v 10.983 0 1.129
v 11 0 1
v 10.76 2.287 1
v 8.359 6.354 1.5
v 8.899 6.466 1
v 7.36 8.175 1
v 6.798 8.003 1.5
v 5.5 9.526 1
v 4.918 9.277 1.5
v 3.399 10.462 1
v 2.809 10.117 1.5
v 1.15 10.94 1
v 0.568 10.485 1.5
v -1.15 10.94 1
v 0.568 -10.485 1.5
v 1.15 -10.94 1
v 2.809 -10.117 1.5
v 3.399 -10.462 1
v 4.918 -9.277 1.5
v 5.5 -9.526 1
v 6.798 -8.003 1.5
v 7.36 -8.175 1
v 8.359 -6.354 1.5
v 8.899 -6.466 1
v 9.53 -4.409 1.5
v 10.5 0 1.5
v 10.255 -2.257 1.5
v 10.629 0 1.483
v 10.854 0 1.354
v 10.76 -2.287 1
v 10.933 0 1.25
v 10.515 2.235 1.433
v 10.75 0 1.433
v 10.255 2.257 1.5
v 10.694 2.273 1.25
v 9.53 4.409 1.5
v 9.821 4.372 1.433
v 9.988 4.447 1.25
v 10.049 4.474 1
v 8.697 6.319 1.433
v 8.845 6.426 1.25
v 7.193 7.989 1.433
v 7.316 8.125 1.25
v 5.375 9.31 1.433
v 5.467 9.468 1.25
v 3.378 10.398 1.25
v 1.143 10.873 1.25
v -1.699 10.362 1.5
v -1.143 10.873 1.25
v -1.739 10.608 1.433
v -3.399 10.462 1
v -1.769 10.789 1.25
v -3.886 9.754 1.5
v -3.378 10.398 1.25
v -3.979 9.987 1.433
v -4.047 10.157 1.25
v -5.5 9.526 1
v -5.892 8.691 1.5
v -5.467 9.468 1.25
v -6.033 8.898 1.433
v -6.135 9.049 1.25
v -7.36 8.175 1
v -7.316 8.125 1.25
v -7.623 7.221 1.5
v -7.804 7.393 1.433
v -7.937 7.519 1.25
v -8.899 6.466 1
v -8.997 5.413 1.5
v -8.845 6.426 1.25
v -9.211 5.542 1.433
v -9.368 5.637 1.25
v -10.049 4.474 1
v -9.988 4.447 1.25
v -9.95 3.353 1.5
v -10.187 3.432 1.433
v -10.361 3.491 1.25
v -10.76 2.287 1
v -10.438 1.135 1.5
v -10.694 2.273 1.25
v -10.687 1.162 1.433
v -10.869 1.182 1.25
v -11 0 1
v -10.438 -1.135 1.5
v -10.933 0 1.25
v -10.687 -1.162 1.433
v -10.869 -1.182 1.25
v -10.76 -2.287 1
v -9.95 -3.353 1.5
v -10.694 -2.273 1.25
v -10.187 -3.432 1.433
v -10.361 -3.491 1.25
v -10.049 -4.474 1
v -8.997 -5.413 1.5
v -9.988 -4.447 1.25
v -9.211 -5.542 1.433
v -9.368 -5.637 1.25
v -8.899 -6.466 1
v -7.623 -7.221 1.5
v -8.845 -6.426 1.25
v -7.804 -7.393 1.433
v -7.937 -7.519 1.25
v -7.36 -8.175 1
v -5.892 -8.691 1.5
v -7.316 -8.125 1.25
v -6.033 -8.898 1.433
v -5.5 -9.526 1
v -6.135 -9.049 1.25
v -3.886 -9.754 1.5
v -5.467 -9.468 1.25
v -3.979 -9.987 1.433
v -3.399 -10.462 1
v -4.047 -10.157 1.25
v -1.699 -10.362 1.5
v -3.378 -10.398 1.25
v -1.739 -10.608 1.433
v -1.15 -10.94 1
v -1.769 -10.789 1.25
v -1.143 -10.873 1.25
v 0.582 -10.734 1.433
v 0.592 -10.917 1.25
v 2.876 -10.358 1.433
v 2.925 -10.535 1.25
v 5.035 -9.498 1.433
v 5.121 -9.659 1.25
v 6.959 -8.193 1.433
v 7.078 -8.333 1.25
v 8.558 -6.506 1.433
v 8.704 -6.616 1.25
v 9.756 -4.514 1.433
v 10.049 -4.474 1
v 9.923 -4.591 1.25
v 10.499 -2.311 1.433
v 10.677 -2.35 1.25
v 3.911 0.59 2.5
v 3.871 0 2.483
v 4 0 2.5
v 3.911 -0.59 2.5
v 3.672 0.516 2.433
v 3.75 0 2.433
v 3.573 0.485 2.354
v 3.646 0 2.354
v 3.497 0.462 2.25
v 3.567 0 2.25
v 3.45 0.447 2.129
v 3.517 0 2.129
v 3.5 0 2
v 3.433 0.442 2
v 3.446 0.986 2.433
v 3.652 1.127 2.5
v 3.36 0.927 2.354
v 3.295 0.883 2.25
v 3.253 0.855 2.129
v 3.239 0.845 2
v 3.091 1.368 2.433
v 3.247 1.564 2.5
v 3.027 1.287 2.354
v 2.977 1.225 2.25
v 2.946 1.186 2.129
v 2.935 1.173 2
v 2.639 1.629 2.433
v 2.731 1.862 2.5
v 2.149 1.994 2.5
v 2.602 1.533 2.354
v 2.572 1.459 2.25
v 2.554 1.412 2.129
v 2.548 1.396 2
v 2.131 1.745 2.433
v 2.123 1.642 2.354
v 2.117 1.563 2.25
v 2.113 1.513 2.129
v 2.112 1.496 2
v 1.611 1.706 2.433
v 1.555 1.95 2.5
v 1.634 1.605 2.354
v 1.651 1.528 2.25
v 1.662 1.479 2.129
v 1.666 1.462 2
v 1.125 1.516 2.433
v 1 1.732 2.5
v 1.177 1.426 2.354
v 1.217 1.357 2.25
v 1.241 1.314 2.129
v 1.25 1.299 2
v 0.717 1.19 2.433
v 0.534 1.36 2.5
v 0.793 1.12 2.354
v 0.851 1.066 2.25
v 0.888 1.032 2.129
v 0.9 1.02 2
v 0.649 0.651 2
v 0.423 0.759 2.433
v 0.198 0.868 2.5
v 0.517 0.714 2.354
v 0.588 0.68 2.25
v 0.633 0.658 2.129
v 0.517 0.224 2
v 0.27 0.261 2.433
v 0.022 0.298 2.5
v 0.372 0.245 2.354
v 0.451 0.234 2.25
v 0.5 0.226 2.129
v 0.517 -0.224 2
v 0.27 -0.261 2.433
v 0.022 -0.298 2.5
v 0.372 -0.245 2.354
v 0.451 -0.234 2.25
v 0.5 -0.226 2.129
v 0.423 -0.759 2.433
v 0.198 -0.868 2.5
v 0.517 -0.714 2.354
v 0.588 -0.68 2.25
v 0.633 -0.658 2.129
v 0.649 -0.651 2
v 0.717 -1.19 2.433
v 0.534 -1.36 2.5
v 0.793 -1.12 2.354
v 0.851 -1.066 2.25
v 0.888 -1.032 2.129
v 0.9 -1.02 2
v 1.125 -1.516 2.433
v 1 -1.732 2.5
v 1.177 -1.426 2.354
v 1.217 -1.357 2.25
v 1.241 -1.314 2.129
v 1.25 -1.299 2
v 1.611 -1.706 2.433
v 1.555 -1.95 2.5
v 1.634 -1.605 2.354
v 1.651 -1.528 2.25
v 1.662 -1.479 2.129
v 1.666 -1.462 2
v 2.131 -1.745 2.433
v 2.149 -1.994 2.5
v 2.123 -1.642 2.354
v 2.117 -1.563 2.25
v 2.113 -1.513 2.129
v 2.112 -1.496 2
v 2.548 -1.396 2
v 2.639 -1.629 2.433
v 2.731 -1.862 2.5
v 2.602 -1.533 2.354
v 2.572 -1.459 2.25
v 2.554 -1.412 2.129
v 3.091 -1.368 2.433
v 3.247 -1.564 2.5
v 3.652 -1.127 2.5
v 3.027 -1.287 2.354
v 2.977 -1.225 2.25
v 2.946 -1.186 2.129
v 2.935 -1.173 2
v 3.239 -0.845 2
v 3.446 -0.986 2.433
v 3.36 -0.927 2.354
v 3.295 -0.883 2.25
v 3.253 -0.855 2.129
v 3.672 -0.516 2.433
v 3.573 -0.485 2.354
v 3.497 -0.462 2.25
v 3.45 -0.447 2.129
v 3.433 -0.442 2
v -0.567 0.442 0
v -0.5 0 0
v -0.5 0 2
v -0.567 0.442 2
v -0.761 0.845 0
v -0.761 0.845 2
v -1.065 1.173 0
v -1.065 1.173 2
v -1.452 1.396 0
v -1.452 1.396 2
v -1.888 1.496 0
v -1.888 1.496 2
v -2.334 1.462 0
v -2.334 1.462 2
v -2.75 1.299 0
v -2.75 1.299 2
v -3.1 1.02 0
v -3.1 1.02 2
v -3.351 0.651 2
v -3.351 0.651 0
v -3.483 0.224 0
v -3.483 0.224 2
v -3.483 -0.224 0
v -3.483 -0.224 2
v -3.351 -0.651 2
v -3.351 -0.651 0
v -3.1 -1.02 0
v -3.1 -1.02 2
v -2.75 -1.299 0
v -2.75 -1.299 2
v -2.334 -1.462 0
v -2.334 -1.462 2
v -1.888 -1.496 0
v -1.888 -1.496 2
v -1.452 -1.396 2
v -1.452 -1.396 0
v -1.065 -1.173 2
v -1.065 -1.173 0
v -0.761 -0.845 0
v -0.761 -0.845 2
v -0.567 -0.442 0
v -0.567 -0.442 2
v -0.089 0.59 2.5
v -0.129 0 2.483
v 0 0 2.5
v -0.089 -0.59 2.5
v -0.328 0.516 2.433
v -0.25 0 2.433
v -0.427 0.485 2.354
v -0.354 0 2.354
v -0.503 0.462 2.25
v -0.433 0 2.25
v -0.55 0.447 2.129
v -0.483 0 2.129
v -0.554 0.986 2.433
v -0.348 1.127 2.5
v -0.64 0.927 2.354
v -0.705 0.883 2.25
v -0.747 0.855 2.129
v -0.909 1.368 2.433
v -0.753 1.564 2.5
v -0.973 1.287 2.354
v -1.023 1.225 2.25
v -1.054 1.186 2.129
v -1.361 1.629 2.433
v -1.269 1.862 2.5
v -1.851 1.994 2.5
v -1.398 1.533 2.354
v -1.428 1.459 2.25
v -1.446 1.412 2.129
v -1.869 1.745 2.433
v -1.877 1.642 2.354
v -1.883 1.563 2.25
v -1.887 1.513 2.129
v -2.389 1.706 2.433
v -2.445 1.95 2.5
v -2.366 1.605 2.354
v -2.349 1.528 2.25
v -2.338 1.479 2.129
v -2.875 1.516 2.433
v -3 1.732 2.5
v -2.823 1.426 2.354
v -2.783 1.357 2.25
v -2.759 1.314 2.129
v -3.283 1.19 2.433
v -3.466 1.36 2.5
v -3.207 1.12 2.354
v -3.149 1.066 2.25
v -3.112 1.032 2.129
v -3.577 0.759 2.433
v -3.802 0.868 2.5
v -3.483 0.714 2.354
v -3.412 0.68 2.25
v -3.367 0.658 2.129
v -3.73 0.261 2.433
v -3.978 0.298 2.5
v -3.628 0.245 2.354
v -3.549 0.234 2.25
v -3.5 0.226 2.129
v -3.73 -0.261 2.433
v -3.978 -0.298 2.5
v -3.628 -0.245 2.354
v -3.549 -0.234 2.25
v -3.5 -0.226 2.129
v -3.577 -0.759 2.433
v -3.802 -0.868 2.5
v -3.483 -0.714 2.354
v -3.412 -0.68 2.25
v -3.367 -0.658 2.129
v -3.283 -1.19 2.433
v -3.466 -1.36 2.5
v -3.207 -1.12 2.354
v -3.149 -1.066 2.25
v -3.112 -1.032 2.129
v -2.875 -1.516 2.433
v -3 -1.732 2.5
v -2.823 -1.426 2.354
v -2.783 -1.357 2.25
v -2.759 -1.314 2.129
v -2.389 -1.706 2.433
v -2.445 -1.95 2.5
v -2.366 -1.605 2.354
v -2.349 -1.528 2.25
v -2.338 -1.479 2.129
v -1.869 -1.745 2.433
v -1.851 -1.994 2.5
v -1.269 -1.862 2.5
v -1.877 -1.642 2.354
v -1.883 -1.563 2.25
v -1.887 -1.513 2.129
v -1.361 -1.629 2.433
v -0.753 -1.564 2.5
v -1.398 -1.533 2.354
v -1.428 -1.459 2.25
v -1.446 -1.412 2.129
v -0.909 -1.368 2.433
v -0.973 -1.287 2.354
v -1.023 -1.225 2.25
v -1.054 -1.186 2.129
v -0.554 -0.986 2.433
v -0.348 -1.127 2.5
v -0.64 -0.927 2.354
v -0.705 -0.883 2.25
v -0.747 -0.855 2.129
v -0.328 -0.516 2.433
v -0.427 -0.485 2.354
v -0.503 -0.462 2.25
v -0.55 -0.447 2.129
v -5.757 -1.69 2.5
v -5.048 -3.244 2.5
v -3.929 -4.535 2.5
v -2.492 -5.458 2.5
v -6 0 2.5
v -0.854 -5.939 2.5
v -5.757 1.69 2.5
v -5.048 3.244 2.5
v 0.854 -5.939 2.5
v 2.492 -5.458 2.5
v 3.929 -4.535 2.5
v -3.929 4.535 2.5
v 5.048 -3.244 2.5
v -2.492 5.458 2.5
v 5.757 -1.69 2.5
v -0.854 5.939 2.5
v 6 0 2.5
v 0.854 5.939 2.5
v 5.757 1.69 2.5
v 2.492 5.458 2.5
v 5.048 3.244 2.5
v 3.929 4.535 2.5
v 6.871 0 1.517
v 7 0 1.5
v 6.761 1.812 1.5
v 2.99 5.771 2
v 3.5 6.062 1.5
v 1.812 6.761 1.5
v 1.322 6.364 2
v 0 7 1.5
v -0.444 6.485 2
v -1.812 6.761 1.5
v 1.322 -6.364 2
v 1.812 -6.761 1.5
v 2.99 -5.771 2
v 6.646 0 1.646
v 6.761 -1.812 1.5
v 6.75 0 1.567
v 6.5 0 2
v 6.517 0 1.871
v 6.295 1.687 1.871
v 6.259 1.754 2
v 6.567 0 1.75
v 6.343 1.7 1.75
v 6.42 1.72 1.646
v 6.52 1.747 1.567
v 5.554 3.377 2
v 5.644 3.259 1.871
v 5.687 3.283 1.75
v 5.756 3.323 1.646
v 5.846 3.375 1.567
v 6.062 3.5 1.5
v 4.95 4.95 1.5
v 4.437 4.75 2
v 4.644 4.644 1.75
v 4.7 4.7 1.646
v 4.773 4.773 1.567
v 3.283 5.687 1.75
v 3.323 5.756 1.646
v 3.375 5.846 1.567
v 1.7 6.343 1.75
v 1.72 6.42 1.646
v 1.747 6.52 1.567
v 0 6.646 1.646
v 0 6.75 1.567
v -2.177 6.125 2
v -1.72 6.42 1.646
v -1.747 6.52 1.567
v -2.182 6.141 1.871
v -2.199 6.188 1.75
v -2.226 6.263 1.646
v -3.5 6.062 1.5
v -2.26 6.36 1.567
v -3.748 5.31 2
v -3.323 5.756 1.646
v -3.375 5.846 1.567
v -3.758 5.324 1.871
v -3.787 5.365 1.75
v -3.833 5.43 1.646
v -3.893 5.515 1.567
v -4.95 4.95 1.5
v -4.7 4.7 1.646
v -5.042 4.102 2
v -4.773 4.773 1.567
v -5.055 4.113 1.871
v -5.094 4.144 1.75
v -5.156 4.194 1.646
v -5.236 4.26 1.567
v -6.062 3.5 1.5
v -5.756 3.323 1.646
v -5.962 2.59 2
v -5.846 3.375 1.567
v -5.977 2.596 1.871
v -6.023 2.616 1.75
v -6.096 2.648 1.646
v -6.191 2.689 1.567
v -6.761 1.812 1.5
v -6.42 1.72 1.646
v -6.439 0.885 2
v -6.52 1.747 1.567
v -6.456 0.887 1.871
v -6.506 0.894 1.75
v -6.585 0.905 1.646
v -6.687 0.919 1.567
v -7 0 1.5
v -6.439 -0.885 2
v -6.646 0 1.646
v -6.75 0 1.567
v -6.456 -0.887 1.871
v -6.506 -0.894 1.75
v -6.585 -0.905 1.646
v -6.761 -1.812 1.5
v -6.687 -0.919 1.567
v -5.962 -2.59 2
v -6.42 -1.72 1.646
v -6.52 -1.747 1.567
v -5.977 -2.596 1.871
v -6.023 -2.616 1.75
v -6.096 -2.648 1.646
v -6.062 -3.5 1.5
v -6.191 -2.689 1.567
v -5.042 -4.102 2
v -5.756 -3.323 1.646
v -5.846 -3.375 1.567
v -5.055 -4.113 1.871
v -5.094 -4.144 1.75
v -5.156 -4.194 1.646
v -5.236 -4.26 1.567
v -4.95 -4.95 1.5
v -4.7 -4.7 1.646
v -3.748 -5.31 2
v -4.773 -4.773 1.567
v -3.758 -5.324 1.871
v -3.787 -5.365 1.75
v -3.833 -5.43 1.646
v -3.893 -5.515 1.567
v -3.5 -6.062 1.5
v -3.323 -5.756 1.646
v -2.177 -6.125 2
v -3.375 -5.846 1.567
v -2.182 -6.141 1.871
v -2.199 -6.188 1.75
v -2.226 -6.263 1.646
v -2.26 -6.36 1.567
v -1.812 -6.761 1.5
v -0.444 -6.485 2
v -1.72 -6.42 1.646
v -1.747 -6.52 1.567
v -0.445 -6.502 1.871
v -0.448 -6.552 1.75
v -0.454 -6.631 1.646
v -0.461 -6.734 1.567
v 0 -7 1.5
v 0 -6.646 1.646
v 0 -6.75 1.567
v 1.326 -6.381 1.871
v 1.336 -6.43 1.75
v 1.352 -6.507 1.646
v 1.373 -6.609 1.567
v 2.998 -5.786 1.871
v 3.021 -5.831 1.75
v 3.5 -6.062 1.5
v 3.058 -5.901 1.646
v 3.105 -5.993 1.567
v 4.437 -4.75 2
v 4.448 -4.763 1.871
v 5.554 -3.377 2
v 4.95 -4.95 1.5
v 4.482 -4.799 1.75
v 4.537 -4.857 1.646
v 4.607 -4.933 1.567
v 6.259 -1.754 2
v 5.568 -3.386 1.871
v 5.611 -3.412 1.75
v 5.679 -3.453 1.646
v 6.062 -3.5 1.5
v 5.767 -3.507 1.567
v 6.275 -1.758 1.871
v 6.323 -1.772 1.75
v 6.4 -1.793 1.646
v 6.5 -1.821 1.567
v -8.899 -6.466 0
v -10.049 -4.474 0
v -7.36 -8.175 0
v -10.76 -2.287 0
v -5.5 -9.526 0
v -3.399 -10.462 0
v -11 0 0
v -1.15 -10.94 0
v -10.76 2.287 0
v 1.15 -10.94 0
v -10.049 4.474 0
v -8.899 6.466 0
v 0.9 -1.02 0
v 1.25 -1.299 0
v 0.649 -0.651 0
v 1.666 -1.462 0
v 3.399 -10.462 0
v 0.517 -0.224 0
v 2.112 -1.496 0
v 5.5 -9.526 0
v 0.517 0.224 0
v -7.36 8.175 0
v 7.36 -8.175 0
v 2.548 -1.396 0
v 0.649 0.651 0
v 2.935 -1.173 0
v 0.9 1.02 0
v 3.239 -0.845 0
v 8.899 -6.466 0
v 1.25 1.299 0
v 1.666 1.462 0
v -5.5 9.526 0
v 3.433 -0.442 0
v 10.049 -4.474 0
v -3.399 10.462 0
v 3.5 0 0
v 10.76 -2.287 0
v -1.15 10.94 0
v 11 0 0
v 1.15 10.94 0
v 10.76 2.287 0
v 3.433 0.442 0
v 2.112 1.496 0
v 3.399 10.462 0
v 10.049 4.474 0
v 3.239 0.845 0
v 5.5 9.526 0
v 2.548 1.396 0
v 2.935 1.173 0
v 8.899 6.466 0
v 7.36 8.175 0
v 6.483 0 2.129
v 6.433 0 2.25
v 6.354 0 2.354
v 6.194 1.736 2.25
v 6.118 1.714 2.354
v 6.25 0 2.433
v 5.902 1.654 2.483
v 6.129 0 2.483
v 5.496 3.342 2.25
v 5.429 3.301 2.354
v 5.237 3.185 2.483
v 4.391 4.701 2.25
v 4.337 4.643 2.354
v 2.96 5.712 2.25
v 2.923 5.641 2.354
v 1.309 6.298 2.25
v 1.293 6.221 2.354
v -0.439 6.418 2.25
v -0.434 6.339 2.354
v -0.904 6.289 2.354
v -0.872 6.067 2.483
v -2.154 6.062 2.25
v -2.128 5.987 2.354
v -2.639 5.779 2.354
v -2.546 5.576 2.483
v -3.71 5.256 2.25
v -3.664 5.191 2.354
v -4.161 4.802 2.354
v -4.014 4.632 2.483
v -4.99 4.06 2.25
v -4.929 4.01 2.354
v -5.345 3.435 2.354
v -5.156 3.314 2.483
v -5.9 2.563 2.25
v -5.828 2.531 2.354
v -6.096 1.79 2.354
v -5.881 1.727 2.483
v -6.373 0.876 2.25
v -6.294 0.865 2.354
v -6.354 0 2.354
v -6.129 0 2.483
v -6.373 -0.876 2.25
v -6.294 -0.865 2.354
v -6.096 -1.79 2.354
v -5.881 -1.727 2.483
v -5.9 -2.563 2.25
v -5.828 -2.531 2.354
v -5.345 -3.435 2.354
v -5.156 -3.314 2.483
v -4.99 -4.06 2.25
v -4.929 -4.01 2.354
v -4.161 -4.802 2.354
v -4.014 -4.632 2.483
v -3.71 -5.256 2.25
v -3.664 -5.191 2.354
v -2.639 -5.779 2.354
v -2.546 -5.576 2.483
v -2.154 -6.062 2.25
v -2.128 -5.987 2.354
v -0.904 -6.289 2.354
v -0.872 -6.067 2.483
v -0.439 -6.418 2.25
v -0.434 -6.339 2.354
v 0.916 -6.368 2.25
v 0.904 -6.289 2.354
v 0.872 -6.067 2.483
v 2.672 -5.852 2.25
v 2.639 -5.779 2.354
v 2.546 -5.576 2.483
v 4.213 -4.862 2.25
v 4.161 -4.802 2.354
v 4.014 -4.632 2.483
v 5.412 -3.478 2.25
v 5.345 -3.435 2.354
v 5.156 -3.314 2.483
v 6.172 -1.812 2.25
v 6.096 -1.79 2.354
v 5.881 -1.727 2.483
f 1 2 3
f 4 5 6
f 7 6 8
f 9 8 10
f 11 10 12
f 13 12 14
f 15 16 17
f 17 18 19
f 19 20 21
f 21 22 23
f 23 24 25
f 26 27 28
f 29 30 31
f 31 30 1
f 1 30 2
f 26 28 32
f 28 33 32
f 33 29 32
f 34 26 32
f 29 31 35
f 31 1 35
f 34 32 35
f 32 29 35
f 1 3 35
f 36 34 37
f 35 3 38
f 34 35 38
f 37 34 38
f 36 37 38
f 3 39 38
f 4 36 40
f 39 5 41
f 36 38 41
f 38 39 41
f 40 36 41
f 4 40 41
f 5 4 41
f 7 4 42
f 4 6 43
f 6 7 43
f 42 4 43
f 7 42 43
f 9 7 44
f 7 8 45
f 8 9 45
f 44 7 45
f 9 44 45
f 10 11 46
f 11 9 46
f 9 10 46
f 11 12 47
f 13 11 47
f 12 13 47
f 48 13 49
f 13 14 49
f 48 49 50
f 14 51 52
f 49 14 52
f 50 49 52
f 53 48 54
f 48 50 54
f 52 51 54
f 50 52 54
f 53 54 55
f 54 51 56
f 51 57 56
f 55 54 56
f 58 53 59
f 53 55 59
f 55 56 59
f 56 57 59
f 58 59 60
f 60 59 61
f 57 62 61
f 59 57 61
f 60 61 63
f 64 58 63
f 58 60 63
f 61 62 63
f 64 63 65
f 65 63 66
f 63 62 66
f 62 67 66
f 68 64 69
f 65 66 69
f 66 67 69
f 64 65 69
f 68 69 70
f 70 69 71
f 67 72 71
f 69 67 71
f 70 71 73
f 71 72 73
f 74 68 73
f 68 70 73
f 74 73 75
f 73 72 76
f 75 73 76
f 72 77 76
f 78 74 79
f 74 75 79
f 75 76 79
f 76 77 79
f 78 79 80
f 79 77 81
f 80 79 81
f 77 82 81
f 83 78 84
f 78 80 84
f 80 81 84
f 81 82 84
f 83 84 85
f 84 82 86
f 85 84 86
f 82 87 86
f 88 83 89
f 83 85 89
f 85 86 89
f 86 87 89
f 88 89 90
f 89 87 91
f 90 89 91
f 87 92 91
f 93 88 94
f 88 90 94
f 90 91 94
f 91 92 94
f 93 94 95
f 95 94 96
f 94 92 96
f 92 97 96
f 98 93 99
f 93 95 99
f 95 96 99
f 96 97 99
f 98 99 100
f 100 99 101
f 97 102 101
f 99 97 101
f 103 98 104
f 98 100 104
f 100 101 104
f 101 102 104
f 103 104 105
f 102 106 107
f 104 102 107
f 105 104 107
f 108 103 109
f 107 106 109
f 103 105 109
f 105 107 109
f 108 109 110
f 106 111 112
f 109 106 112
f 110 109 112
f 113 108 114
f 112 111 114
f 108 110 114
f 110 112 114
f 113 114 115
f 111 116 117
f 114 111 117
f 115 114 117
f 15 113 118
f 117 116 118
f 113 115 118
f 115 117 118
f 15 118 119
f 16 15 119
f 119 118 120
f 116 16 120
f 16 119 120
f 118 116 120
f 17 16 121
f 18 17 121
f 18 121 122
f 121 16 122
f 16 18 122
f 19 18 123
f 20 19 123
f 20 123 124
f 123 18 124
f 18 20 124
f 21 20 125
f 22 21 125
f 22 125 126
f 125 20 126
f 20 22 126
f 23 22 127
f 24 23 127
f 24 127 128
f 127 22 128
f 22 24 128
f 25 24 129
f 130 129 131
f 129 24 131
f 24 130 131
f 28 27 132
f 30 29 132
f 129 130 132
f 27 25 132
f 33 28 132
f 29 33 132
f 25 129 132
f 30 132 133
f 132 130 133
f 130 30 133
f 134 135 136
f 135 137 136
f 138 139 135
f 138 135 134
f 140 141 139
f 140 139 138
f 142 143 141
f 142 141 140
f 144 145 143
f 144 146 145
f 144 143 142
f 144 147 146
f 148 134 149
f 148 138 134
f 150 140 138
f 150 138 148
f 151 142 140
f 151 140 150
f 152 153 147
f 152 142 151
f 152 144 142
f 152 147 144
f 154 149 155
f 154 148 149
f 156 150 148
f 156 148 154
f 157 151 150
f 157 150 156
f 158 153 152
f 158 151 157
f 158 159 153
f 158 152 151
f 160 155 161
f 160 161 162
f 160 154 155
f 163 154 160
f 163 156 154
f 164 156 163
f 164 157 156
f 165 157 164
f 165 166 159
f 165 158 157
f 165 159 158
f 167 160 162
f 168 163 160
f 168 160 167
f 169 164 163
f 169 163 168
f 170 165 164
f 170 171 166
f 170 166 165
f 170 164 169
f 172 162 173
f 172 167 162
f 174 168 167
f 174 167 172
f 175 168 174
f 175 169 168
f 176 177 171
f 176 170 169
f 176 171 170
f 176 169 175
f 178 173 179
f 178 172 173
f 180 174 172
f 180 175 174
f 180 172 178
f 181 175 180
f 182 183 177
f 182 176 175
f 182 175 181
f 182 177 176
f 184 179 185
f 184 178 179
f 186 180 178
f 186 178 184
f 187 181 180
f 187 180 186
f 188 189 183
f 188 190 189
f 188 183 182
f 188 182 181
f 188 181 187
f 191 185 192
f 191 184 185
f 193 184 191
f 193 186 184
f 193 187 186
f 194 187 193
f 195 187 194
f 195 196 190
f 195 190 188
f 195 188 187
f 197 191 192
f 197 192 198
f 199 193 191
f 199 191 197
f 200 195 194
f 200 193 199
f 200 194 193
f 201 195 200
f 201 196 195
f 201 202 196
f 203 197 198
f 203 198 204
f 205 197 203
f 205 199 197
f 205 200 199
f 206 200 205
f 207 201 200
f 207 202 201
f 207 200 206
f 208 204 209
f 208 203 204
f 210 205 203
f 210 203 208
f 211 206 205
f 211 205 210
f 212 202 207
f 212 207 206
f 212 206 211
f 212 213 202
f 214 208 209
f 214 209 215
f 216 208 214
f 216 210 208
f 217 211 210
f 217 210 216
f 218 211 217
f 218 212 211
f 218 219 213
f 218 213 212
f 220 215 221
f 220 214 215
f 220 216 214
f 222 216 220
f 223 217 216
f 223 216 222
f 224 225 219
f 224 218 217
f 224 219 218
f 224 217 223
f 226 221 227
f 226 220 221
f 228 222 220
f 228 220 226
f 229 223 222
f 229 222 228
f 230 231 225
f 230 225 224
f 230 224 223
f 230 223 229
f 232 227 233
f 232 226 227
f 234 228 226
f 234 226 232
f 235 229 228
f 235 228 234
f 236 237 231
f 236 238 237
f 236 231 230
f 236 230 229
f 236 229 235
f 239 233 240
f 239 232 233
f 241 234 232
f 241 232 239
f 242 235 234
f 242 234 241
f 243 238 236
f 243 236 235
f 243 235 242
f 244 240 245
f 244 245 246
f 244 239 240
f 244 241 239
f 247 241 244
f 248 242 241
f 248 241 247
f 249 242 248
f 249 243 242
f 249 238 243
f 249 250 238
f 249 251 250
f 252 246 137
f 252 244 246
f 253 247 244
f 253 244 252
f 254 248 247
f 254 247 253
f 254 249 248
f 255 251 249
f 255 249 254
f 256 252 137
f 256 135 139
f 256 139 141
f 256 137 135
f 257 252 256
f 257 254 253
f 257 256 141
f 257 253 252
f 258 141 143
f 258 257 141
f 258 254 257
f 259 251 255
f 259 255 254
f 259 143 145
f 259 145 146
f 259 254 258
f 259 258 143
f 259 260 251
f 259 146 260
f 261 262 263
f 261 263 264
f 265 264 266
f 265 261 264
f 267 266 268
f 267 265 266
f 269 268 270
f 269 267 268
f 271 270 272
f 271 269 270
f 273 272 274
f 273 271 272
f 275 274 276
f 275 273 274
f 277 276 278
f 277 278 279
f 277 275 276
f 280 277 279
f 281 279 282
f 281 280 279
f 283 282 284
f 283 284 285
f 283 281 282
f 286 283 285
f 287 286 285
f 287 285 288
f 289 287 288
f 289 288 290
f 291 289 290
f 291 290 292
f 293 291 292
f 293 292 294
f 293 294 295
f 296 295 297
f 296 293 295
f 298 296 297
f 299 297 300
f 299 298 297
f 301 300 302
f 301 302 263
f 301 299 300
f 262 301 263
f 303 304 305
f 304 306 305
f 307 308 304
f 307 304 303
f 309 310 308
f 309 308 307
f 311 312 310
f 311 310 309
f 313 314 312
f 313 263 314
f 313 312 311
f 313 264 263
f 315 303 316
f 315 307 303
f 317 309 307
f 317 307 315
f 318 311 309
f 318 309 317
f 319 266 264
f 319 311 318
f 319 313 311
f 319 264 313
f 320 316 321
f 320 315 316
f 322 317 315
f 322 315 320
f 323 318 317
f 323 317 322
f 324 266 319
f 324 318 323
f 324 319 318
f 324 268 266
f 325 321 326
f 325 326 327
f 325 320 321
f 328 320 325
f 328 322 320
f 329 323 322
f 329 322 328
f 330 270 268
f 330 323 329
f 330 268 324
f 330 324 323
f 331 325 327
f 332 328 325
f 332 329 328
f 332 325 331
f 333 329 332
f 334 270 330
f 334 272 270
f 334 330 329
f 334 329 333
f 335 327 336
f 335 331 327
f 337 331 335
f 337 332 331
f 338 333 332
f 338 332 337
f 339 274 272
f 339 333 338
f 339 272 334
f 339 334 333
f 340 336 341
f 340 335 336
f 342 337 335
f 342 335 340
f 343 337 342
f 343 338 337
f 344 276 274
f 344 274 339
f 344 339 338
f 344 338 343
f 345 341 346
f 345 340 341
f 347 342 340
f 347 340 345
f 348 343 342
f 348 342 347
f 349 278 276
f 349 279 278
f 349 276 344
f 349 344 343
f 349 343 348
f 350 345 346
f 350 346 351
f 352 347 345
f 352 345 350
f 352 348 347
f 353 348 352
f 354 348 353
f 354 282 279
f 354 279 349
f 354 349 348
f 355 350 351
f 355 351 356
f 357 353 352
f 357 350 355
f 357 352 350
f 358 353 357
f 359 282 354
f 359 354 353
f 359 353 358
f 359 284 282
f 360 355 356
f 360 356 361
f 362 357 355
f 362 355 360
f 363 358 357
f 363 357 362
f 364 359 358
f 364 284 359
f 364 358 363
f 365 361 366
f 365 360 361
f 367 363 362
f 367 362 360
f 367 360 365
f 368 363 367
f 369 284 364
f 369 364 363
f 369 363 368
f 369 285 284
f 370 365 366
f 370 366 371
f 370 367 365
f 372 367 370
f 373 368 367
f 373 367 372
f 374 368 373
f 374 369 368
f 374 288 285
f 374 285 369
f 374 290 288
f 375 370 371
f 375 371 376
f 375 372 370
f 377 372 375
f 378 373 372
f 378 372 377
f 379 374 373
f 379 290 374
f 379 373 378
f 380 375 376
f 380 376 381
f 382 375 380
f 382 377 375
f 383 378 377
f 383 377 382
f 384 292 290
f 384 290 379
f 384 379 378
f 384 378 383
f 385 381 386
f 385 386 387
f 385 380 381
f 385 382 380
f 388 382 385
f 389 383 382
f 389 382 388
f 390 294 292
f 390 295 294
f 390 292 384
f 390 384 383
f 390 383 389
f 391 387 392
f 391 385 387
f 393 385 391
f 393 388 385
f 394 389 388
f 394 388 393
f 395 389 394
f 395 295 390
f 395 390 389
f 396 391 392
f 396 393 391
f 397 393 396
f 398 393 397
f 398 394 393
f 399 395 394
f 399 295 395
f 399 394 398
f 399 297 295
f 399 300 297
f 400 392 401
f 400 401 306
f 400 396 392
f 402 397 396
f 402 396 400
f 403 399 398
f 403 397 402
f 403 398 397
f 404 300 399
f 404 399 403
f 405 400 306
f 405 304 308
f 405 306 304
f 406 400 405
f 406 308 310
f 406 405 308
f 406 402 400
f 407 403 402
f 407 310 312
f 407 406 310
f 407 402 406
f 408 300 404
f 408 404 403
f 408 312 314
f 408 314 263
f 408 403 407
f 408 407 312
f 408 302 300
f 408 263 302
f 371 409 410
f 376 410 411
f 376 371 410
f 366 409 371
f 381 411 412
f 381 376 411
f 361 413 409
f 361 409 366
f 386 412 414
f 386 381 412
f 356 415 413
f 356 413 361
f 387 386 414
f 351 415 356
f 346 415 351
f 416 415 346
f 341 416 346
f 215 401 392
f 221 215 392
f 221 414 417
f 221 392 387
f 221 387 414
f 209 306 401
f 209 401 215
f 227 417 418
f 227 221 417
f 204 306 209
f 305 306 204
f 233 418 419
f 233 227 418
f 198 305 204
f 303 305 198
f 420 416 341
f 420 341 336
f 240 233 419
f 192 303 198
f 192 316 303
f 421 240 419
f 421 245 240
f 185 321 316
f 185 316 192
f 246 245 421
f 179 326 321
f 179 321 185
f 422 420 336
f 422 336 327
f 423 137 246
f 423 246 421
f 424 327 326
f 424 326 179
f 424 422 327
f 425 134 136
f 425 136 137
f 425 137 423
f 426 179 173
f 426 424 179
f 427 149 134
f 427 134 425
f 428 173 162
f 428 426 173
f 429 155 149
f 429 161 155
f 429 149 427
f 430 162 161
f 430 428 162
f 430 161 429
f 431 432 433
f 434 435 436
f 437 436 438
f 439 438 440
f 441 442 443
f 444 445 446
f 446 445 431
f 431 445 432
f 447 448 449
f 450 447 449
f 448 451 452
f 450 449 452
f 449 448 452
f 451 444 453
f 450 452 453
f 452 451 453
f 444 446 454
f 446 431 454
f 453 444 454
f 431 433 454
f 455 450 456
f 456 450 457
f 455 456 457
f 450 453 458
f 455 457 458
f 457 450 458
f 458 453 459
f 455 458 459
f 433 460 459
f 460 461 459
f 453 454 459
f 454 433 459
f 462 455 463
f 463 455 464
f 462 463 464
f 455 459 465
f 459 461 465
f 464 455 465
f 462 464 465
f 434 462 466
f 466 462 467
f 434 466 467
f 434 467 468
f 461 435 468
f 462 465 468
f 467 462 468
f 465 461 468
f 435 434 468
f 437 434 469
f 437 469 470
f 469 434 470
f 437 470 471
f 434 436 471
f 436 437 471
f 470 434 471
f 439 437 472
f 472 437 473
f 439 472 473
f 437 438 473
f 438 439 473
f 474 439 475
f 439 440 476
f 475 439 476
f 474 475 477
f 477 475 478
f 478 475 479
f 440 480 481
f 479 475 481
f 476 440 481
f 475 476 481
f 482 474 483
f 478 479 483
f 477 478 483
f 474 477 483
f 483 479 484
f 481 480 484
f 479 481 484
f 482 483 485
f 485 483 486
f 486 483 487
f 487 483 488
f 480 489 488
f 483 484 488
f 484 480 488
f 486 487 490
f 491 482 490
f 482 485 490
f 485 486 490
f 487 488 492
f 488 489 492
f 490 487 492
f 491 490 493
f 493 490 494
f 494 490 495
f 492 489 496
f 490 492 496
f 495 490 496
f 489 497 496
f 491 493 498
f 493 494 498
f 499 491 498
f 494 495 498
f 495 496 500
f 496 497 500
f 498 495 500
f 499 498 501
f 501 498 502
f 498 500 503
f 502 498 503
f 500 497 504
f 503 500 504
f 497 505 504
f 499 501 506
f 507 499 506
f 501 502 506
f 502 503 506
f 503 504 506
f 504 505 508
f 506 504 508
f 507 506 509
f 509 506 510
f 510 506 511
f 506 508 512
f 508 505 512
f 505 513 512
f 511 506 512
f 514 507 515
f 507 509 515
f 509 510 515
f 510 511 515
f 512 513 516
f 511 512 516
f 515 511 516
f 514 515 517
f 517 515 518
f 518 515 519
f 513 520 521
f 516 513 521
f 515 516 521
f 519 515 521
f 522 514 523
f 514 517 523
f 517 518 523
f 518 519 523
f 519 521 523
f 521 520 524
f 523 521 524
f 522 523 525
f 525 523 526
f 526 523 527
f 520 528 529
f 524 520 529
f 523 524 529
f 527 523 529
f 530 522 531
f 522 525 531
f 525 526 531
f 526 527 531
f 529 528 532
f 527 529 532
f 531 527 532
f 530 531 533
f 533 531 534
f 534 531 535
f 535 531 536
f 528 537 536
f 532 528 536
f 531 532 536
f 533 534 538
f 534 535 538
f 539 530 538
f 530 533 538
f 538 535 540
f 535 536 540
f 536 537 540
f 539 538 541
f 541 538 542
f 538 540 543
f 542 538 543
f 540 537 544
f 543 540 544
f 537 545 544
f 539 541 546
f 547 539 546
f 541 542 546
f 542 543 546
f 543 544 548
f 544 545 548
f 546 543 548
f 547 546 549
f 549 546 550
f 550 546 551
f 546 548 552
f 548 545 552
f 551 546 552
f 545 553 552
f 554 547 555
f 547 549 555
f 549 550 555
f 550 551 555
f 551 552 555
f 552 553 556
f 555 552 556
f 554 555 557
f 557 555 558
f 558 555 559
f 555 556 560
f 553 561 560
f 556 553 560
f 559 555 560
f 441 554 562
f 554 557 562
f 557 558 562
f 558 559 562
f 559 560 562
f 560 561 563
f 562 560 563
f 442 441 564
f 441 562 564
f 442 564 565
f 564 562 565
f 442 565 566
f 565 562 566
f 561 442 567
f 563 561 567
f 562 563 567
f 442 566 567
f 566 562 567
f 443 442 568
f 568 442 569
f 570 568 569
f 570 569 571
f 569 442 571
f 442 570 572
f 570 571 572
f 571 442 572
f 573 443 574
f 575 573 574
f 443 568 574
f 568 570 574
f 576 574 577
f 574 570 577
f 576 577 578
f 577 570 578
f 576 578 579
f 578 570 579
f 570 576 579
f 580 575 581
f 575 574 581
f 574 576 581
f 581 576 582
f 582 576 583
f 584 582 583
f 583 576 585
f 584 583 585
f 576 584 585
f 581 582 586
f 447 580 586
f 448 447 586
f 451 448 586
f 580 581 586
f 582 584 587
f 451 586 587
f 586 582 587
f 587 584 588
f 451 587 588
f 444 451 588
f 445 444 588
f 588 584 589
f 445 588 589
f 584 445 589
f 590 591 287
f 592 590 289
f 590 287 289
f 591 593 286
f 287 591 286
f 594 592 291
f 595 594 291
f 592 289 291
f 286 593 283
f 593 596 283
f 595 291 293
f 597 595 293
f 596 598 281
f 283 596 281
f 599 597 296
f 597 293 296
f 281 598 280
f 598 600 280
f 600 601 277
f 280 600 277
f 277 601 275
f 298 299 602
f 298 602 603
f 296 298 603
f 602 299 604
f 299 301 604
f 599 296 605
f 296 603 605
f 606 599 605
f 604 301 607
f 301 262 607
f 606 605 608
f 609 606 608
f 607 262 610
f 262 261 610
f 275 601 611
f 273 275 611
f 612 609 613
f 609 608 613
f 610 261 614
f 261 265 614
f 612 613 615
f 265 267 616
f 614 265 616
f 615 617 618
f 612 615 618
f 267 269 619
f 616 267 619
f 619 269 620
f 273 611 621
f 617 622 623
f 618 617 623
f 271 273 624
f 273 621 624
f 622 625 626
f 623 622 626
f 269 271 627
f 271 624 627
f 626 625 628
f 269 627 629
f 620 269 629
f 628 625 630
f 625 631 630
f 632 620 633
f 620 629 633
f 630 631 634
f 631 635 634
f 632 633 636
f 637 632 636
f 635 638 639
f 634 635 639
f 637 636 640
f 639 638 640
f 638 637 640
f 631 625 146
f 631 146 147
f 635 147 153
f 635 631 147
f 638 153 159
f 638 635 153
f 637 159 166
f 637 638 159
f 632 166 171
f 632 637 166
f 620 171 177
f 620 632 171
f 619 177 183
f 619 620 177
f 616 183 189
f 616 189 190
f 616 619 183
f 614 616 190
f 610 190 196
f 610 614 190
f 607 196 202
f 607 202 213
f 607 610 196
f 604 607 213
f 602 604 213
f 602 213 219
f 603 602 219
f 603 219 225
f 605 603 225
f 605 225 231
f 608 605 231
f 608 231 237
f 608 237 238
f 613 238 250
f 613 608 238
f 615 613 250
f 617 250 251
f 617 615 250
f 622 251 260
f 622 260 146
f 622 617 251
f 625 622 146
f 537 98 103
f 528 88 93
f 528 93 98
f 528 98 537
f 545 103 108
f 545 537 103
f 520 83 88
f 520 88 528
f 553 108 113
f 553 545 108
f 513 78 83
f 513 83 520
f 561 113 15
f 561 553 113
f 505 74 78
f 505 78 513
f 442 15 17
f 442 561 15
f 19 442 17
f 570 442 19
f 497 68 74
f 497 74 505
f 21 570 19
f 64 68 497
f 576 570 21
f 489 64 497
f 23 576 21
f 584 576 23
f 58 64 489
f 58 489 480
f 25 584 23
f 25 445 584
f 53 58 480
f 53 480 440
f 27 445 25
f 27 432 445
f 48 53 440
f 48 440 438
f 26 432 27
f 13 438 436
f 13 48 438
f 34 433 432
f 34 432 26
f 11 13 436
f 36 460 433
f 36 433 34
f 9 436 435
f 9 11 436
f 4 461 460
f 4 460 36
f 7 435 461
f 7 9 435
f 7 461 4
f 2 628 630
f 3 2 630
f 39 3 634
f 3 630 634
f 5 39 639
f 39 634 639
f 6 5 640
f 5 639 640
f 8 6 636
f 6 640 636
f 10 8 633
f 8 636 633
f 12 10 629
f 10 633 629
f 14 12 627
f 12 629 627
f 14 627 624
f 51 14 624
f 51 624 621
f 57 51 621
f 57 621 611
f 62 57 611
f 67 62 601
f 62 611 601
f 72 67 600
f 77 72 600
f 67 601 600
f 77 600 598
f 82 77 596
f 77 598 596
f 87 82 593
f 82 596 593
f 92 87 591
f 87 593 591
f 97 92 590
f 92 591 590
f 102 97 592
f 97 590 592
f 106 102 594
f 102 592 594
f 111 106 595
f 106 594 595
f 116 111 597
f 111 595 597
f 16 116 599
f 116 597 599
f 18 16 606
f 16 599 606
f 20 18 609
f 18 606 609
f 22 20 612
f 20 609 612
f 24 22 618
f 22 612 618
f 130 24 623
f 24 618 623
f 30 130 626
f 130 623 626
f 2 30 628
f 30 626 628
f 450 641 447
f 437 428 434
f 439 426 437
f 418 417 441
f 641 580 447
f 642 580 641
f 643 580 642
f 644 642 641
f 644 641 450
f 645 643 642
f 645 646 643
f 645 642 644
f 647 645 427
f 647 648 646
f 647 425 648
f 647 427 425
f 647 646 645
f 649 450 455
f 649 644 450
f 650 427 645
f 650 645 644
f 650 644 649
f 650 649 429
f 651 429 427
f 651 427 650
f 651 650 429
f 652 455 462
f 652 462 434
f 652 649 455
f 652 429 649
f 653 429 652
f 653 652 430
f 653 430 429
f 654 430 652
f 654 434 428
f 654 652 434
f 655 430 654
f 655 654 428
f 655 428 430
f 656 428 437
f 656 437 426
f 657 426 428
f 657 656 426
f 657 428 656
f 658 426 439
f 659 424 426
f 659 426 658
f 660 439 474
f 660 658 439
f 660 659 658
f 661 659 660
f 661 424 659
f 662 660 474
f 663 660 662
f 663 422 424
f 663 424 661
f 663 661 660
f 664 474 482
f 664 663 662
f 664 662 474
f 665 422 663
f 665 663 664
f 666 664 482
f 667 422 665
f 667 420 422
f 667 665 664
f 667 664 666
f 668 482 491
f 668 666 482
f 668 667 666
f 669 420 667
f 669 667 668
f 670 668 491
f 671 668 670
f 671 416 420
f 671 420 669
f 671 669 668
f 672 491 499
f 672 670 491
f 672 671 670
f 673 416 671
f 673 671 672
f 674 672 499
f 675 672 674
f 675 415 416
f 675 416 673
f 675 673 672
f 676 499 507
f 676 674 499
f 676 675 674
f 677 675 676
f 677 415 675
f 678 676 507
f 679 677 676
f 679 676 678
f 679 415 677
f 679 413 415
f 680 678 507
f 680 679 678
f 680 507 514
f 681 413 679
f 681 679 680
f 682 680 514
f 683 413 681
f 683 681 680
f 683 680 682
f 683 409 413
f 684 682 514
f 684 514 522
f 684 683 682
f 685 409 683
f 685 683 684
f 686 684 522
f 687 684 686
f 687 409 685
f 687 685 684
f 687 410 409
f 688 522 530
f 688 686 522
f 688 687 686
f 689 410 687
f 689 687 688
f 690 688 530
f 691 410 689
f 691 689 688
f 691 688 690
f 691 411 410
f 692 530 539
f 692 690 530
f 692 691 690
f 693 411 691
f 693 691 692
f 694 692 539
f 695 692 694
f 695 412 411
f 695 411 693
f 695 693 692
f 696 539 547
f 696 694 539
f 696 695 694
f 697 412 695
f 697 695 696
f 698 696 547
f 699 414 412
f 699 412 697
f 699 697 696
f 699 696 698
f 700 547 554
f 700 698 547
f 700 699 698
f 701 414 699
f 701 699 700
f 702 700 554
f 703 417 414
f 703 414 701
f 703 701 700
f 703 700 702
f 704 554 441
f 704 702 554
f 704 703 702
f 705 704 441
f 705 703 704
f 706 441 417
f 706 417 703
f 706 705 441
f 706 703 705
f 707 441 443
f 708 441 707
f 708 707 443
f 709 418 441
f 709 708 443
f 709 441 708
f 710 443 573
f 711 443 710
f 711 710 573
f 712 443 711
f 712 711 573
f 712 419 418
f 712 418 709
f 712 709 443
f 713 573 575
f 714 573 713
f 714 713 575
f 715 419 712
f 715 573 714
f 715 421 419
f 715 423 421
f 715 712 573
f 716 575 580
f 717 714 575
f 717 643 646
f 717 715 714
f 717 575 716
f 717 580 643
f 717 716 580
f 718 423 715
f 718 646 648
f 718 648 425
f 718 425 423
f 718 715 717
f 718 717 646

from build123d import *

# Parameters (mm, degrees)
F0_R     = 11
F0_R_2   = 6.5
F1_DEPTH = 1.5
F0_R_3   = 1.5
F2_DEPTH = 2.5
F3_R     = 0.49999


# Not quite as in the source:
# - a fillet or chamfer is up to 0.001 mm smaller than in the source, because OpenCascade refuses the exact size


with BuildPart() as f1:
    # F0 (on Top) → F1 (new body)
    with BuildSketch(Plane.XY):
        Circle(F0_R)
        Circle(F0_R_2, mode=Mode.SUBTRACT)
    extrude(amount=F1_DEPTH)

    # F0 (on Top) → F2 (join)
    with BuildSketch(Plane.XY):
        Circle(F0_R_2)
        with Locations((-2, 0)):
            Circle(F0_R_3, mode=Mode.SUBTRACT)
        with Locations((2, 0)):
            Circle(F0_R_3, mode=Mode.SUBTRACT)
    extrude(amount=F2_DEPTH)

    # F3 (radius 0.5 in the source; OpenCascade refuses exactly that, so slightly less here)
    f3_edges = [f1.edges().sort_by_distance(p)[0] for p in [
        (-11, 0, 1.5),
        (-6.5, 0, 1.5),
        (-6.5, 0, 2.5),
        (0.5, 0, 2.5),
        (-3.5, 0, 2.5),
    ]]
    fillet(f3_edges, radius=F3_R)


solid = f1.part
